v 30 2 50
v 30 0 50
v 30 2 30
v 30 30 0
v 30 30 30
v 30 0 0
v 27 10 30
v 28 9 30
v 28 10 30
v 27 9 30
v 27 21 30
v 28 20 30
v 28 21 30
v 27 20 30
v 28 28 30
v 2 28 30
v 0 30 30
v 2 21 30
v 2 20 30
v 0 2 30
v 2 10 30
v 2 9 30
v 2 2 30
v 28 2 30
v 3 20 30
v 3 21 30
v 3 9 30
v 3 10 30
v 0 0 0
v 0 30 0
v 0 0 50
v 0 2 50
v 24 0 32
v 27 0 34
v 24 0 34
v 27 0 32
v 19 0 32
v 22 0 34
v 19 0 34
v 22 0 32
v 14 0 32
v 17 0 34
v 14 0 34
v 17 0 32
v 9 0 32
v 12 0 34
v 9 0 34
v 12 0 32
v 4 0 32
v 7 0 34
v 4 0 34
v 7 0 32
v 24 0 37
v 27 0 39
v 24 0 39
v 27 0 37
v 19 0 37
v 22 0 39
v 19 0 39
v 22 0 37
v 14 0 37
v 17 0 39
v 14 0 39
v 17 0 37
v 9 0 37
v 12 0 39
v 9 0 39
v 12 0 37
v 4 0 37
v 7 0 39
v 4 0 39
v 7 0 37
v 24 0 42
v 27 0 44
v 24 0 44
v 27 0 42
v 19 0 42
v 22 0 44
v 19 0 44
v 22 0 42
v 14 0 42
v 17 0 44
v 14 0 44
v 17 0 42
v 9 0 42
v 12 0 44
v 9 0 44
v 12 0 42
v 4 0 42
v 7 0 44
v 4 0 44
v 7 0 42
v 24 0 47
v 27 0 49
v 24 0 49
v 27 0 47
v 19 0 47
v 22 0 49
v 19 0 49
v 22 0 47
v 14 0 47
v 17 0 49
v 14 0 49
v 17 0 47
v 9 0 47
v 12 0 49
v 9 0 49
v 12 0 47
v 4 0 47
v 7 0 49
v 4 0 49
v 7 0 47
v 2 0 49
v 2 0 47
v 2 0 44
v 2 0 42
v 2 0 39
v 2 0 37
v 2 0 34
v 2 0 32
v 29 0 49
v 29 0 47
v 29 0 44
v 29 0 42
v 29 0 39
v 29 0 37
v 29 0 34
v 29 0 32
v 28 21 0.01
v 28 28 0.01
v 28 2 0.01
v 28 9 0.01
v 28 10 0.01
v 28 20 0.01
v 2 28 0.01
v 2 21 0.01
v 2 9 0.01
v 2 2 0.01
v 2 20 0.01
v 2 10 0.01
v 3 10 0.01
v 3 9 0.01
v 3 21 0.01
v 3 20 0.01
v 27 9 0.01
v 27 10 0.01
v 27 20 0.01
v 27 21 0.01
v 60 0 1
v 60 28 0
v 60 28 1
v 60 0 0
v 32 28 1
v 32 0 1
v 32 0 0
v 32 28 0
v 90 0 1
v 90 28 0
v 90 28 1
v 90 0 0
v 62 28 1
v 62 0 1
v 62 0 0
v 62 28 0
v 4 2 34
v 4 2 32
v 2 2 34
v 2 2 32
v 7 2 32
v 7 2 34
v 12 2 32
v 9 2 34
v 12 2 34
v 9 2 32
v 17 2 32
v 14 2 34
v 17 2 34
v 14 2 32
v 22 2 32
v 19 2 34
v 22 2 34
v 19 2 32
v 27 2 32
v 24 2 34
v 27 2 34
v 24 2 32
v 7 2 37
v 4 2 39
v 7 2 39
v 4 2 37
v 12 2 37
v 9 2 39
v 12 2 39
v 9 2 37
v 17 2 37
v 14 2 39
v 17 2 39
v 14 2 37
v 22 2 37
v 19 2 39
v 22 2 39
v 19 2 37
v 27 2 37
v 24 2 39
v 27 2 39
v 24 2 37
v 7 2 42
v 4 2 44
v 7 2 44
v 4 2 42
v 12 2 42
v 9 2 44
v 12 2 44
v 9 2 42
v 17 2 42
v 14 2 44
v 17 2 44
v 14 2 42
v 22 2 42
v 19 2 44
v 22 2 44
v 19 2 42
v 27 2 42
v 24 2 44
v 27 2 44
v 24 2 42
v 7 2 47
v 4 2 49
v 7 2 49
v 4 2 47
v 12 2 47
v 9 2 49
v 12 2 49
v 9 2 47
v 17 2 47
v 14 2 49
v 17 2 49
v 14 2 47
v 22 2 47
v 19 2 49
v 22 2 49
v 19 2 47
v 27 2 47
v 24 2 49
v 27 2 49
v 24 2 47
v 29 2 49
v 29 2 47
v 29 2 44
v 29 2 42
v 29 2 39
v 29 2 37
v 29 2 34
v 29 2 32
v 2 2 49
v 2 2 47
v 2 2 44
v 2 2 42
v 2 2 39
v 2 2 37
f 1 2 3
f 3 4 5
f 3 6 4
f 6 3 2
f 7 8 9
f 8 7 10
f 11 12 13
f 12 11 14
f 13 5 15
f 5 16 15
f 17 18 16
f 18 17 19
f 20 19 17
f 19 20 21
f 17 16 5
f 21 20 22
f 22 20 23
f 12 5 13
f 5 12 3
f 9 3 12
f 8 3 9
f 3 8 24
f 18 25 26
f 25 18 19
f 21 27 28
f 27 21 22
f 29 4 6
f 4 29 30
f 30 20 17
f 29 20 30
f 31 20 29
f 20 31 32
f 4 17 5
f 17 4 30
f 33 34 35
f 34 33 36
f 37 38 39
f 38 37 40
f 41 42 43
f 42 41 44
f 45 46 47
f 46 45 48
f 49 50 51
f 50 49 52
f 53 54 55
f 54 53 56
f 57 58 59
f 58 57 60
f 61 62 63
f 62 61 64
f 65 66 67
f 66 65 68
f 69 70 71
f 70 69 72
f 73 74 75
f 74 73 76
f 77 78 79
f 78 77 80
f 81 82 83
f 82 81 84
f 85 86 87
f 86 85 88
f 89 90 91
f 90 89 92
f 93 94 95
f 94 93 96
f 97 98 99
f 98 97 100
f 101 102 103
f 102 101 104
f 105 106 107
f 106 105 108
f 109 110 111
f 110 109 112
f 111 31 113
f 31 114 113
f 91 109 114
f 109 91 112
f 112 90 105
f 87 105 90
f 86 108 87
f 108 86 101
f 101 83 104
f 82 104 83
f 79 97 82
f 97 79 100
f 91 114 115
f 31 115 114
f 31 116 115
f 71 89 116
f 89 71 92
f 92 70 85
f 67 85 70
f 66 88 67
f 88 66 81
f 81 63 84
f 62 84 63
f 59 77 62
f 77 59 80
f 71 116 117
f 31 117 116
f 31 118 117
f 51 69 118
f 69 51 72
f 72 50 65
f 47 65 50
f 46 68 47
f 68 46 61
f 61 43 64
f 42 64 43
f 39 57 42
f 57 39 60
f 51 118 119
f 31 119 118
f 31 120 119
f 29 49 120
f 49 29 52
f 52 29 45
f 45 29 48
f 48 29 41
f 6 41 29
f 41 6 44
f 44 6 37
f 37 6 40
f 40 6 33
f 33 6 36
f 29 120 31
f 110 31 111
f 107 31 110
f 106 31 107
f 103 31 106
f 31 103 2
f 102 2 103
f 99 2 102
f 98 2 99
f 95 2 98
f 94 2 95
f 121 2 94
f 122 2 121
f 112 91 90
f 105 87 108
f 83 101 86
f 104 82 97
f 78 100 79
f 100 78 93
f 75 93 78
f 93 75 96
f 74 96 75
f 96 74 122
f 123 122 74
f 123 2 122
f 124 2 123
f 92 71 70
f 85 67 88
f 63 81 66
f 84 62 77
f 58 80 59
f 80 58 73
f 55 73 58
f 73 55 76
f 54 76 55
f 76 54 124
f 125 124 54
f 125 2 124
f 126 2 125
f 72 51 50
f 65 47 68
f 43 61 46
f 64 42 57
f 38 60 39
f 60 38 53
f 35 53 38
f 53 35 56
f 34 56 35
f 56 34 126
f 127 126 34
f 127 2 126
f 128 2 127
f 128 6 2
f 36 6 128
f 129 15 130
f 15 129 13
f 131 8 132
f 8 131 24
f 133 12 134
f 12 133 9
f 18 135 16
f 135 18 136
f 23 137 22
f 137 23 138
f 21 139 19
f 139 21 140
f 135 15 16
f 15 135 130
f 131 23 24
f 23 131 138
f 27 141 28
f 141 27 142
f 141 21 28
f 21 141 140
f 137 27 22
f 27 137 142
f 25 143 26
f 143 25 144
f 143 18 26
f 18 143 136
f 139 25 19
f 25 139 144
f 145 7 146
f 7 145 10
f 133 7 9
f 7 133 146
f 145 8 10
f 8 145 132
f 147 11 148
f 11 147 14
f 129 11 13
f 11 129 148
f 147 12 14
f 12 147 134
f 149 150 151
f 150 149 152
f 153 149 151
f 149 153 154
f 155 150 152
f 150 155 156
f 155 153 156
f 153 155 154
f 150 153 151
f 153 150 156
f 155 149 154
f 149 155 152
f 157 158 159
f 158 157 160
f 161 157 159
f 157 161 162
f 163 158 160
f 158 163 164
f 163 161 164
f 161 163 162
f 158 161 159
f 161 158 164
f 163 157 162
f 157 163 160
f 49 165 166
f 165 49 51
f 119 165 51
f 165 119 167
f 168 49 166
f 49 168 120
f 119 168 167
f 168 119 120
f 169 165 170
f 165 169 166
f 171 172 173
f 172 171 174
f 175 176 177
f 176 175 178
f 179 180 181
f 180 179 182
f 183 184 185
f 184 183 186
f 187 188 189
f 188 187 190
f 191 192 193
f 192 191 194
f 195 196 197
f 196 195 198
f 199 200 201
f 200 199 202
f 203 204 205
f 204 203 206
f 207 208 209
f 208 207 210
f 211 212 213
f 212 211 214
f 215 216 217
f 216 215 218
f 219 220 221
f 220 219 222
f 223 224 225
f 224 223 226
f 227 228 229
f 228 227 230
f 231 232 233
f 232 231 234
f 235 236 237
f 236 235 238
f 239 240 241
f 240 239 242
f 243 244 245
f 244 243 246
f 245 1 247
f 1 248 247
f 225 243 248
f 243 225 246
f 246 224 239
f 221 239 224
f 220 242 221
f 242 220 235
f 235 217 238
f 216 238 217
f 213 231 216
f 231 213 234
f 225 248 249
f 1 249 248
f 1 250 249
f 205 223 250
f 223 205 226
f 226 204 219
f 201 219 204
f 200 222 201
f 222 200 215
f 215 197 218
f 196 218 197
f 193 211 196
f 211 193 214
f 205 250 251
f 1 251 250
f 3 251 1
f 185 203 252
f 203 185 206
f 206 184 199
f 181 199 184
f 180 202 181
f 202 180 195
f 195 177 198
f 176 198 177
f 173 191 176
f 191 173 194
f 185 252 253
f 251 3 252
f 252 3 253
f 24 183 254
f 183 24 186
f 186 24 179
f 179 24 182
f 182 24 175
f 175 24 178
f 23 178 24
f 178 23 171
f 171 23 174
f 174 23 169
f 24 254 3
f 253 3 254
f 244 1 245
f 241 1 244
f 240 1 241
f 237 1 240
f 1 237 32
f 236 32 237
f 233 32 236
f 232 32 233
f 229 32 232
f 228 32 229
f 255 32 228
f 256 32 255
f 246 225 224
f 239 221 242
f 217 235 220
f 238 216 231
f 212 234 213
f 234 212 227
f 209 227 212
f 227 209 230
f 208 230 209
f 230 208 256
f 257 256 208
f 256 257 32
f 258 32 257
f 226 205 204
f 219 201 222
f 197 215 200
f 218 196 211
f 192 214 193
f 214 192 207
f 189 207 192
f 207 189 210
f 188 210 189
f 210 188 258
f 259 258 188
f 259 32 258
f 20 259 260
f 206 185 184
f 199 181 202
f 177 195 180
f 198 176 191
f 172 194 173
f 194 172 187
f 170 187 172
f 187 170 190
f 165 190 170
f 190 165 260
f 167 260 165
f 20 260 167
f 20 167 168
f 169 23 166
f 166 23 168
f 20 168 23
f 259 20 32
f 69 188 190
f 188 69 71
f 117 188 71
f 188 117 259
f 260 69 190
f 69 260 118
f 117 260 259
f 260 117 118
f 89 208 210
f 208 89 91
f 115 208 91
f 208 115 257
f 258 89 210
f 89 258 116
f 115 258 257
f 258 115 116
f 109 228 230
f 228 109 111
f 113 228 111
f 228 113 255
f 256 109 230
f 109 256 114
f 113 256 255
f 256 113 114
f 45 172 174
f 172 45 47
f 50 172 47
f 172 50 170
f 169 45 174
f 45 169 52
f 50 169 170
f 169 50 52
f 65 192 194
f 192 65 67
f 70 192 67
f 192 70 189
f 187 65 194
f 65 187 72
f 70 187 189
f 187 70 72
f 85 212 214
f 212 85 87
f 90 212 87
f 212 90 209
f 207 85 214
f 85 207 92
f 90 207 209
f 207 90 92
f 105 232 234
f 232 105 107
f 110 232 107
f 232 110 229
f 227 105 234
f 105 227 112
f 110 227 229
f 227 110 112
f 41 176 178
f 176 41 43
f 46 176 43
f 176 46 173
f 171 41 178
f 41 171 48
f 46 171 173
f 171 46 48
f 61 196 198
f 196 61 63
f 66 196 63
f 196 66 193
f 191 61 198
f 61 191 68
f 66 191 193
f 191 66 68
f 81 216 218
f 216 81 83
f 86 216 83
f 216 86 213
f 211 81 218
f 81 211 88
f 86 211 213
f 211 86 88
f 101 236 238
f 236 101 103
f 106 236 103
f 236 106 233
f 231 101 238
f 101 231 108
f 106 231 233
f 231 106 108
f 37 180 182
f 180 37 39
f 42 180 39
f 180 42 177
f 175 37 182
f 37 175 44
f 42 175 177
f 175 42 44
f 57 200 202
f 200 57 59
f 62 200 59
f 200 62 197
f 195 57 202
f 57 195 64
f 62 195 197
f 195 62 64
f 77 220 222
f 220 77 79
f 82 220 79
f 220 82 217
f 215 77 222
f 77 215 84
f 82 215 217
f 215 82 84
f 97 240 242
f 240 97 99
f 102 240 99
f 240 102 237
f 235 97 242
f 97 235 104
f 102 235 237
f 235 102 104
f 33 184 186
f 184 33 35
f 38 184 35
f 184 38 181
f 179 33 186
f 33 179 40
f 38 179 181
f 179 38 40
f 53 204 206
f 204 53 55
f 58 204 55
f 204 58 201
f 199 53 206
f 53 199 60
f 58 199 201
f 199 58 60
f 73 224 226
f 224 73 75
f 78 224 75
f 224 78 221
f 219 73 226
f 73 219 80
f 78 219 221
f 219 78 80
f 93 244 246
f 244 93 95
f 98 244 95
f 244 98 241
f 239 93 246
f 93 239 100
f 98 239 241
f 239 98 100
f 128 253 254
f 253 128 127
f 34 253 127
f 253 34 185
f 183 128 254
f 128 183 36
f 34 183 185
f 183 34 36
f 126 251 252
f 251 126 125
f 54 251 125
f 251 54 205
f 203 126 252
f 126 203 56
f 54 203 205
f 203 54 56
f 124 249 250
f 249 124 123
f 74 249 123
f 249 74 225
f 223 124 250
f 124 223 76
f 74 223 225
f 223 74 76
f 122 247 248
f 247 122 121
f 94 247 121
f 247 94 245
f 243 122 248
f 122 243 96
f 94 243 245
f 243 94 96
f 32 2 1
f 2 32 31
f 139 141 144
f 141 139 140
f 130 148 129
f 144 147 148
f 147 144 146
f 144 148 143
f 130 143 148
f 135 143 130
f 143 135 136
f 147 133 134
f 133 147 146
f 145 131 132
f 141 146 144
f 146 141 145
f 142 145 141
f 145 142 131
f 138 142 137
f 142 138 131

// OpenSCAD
// Parametre for underlag og rektangler
base_width = 30;       // Bredde af underlag
base_depth = 30;       // Dybde af underlag
wall_height = 30;      // Højde af væggene
wall_thickness = 2;   // Tykkelse af væggene
post_width = 1;        // Bredde af stolperne
post_thickness = 1;    // Tykkelse af stolperne

// Parametre for de nye plader
new_plate_width = 28;  // Bredde af de nye plader
new_plate_height = 28; // Højde af de nye plader
new_plate_thickness = 1; // Tykkelse af de nye plader

// Afstand mellem rektanglerne og stolperne
spacing = 2;

// Parametre for huller i rektangler
hole_diameter = 2;     // Diameter af hullerne
hole_spacing = 5;      // Afstand mellem hullerne

// Funktion til at generere et underlag
module base() {
    cube([base_width, base_depth, 0.01]);
}

// Funktion til at generere rektanglerne som vægge
module walls() {
    difference() {
        cube([base_width, base_depth, wall_height]);
        translate([wall_thickness, wall_thickness, 0]) {
            cube([base_width - 2 * wall_thickness, base_depth - 2 * wall_thickness, wall_height]);
        }
    }
}

// Funktion til at generere stolperne ved siden af rektanglerne
module posts() {
    for (x = [spacing, base_width - post_width - spacing]) {
        for (y = [spacing + 7, base_depth - post_width - spacing - 7]) {
            translate([x, y, 0])
            cube([post_width, post_width, wall_height]);
        }
    }
}

// Funktion til at generere de nye plader
module new_plates() {
    // Plade 1 til højre for kassen
    translate([base_width + 2, 0, 0])
    cube([new_plate_width, new_plate_height, new_plate_thickness]);

    // Plade 2 med afstand til den første plade
    translate([base_width + 2 + new_plate_width + 2, 0, 0])
    cube([new_plate_width, new_plate_height, new_plate_thickness]);
}

// Funktion til at generere den nye rektangel med vandrette huller
module new_rect_with_holes() {
    difference() {
        cube([base_width, 2, 20]);  // Ny rektangel: 30cm bred, 20cm høj, 2cm tyk
        for (x = [2:hole_spacing:base_width - hole_diameter]) {
            for (z = [2:hole_spacing:20 - hole_diameter]) {
                translate([x, 0, z])
                cube([hole_diameter, 2, hole_diameter]);
            }
        }
    }
}

// Generer underlag, vægge, stolper, de nye plader og den nye rektangel med huller
union() {
    base();
    walls();
    posts();
    new_plates();
    translate([0, 0, wall_height])
    new_rect_with_holes();
}
